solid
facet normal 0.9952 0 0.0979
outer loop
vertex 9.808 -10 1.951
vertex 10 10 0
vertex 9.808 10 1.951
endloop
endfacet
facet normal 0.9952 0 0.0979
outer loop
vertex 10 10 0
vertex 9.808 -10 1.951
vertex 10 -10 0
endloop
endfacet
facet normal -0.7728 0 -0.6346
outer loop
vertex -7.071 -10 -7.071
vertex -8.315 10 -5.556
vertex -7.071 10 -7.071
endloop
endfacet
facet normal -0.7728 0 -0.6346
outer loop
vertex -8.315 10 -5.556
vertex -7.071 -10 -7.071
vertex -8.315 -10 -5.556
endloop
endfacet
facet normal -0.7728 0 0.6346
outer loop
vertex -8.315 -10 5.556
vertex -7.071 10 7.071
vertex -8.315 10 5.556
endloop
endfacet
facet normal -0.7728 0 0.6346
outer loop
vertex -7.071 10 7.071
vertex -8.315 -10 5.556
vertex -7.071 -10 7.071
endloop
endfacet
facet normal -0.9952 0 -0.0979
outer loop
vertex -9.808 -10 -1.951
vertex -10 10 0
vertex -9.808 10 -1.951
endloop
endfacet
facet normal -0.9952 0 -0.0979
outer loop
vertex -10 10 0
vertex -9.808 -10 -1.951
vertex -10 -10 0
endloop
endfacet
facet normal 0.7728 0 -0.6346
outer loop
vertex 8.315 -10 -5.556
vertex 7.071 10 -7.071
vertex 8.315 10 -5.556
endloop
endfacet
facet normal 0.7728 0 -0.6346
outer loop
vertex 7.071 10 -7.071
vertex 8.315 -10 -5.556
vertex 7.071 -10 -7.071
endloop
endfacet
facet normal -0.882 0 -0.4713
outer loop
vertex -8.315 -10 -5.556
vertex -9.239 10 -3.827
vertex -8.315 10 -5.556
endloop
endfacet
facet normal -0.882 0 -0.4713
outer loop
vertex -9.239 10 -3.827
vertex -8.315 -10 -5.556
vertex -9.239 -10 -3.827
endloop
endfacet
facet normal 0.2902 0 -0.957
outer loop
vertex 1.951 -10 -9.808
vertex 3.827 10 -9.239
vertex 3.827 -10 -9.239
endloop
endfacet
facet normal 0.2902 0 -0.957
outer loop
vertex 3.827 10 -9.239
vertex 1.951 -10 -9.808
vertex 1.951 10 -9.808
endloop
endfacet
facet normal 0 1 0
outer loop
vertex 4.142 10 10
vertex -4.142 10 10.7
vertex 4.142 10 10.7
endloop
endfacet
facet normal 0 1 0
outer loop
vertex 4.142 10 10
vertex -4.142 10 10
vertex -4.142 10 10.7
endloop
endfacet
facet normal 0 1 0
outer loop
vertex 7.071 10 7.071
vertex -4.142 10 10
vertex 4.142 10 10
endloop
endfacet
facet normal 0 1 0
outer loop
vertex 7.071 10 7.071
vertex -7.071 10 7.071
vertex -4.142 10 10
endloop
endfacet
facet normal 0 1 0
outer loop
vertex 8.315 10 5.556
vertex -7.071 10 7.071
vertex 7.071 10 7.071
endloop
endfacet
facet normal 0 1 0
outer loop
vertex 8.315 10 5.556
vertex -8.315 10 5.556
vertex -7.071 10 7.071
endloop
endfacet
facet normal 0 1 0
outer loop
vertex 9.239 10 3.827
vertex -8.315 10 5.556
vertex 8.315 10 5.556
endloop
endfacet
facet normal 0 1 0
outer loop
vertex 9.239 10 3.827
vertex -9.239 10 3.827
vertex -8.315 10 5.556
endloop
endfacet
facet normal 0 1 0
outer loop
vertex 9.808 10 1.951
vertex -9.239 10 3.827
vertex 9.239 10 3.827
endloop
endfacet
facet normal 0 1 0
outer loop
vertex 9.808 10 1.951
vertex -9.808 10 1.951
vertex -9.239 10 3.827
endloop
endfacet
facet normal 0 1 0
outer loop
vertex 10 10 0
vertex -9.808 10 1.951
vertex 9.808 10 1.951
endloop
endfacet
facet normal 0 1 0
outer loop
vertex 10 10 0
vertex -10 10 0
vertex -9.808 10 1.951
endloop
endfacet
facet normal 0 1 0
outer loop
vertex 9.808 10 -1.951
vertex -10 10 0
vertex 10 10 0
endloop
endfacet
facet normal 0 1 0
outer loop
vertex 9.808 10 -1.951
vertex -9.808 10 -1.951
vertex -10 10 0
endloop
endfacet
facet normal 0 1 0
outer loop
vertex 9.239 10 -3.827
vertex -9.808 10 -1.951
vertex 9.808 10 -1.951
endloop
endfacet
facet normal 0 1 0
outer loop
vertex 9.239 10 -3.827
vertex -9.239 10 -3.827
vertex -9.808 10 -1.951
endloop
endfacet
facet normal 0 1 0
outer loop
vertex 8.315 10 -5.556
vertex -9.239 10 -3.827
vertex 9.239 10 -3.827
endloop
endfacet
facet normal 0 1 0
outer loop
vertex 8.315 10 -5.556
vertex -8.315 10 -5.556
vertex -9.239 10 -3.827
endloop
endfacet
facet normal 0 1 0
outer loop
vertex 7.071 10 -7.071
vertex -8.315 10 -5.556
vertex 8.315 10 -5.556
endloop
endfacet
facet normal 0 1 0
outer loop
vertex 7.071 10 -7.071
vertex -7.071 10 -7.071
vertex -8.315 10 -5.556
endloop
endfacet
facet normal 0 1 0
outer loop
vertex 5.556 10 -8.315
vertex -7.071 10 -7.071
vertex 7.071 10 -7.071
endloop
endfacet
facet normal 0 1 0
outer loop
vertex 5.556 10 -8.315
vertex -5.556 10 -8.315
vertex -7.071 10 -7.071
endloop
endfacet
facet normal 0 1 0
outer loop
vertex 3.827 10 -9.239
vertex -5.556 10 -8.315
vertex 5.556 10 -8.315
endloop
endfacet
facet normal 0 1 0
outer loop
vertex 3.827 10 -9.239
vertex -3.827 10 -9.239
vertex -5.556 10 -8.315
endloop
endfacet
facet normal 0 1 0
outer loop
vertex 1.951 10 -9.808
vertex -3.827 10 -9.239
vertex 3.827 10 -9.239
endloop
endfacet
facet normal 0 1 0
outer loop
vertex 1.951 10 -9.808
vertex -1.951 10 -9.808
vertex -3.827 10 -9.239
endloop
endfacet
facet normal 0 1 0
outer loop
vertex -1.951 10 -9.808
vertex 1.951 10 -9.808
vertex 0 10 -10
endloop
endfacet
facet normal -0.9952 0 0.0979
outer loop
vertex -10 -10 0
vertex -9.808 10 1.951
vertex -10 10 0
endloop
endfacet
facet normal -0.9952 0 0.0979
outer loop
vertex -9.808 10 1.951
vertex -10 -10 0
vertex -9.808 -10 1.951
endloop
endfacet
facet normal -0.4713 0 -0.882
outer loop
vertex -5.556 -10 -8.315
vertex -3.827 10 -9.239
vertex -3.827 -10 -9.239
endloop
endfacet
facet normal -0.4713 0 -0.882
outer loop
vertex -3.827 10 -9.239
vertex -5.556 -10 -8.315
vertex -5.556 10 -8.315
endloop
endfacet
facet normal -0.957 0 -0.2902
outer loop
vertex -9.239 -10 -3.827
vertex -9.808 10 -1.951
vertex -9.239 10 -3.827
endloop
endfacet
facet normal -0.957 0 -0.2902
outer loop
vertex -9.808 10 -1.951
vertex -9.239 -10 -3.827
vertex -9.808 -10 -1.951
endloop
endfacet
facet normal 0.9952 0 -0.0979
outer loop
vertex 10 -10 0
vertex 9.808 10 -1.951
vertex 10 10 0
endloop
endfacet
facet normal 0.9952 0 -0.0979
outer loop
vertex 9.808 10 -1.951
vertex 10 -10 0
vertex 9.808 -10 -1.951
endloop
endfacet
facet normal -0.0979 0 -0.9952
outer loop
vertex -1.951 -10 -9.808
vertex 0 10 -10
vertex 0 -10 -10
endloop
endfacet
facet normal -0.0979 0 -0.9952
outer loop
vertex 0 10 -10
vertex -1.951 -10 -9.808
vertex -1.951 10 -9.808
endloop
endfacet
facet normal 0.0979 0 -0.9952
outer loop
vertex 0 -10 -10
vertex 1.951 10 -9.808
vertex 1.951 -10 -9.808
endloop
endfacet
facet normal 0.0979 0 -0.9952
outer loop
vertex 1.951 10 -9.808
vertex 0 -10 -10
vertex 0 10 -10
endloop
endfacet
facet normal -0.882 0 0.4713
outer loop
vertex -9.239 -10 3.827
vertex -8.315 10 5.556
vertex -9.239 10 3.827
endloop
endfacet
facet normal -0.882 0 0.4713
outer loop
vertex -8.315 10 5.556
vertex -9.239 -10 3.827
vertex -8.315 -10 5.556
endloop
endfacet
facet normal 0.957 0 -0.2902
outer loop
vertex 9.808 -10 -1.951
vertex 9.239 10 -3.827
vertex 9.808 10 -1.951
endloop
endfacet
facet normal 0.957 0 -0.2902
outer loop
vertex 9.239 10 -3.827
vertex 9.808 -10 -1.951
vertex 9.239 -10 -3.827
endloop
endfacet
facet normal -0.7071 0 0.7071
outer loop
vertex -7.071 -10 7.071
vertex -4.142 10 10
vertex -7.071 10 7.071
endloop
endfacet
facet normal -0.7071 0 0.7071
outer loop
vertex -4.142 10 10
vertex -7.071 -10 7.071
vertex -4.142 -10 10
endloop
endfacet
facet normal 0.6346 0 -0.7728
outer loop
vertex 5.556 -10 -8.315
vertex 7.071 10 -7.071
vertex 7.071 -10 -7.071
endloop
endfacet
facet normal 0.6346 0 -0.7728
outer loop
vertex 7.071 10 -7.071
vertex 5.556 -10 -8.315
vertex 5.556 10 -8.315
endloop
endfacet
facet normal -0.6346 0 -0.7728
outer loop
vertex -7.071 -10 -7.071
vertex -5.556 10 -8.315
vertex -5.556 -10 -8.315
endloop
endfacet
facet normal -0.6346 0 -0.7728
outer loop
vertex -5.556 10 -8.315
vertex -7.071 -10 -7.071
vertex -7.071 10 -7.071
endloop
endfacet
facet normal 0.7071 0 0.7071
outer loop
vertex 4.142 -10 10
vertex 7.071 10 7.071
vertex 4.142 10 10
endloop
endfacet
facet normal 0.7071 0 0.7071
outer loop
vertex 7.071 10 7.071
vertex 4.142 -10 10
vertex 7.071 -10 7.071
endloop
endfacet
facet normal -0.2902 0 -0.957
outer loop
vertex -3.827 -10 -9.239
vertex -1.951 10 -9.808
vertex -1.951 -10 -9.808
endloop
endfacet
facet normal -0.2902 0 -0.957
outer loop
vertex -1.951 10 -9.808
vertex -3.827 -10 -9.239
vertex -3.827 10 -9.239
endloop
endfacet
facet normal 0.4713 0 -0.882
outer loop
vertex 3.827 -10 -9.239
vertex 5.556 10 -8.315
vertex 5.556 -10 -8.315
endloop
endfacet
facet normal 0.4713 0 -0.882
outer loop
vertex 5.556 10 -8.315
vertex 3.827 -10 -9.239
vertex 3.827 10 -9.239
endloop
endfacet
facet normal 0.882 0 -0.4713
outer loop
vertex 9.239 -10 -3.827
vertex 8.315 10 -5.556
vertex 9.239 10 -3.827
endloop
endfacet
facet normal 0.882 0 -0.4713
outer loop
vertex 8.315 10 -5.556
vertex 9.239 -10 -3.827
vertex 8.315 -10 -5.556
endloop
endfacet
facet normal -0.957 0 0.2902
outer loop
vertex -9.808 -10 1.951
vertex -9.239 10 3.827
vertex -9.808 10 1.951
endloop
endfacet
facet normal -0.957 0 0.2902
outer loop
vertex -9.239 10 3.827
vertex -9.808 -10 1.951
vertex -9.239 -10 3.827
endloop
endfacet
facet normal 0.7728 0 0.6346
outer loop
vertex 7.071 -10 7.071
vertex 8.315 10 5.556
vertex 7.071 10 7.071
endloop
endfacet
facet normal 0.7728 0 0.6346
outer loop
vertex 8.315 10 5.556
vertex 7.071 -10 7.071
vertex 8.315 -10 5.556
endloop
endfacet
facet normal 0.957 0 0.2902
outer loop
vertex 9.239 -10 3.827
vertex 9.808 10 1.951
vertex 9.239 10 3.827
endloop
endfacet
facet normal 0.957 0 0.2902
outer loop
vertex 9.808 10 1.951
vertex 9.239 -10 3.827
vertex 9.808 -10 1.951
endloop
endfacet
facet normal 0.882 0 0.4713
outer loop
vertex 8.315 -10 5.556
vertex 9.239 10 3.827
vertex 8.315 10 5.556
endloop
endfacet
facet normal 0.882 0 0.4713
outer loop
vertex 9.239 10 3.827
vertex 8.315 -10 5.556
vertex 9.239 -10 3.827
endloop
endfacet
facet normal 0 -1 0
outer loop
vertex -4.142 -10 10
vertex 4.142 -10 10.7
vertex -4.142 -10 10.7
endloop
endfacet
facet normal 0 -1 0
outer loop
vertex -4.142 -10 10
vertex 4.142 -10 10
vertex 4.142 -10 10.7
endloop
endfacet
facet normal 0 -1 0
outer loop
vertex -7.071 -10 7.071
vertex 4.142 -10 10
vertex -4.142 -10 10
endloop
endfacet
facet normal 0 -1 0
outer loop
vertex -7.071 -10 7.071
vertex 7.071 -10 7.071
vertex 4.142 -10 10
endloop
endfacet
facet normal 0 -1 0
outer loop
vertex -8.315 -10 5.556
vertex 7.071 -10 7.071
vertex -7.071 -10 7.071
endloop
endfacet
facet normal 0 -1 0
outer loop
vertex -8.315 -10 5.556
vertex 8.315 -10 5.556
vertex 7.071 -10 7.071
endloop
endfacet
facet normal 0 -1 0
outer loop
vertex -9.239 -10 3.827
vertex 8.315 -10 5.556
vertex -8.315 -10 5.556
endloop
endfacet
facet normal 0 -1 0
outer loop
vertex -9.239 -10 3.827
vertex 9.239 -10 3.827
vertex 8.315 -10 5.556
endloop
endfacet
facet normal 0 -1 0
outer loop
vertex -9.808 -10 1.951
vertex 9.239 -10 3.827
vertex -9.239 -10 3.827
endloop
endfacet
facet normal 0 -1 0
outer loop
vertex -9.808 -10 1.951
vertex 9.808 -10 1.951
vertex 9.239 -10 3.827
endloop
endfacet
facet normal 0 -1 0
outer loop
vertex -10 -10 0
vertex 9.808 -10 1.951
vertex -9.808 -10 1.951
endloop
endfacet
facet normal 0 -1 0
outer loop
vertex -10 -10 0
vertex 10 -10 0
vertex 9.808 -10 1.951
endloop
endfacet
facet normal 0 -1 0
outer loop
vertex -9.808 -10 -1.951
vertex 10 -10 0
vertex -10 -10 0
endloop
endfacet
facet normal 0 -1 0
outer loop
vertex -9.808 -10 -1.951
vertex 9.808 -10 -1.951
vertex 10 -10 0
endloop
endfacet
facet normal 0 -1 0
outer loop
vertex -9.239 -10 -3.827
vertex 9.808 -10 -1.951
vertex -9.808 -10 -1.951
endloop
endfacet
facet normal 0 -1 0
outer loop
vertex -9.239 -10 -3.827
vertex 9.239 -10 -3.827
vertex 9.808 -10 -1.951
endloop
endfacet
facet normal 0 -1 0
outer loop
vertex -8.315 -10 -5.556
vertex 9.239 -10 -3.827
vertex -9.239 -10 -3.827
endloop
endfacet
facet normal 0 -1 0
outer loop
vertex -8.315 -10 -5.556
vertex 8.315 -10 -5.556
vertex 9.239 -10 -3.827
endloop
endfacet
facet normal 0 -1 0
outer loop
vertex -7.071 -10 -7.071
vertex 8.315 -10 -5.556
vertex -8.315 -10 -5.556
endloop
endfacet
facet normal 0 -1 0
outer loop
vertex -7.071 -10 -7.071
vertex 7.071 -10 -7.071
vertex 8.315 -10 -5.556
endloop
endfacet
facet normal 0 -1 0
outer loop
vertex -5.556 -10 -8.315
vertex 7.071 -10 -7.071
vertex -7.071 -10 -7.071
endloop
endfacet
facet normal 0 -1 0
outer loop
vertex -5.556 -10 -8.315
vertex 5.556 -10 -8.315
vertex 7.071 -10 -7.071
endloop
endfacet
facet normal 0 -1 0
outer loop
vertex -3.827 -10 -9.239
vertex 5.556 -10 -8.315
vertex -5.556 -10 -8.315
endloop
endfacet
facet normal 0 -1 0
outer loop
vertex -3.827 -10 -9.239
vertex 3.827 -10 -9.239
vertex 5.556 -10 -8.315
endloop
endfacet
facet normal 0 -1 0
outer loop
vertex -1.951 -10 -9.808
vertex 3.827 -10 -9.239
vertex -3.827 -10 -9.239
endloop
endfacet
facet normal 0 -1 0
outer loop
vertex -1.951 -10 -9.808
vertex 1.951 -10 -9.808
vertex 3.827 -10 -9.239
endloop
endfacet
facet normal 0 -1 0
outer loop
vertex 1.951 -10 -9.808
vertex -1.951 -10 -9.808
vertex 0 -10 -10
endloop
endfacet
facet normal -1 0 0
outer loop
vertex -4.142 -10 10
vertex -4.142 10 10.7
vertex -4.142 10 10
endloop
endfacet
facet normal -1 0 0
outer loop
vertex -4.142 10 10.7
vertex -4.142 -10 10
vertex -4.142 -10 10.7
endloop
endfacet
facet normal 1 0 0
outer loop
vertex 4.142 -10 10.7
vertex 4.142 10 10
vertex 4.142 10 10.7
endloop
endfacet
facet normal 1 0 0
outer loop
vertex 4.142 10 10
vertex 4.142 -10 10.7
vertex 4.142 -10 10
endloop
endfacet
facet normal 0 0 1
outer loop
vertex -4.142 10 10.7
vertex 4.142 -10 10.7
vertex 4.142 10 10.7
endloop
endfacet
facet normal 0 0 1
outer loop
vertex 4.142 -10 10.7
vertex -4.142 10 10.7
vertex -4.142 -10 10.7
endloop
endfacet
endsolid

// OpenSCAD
//utilities
module reflect(axis){ //reflects its children about the origin, but keeps the originals
	children();
	mirror(axis) children();
}
module repeat(delta,N,center=false){ //repeat something along a regular array
	translate( (center ?  -(N-1)/2 : 0) * delta)
				for(i=[0:1:(N-1)]) translate(i*delta) children();
}

module oldnut(d,h=-1,center=false,fudge=1,shaft=false){ //make a nut, for metric bolt of nominal diameter d
	//d: nominal bolt diameter (e.g. 3 for M3)
	//h: height of nut
	//center: works as for cylinder
	//fudge: multiply the diameter by this number (1.22 works when vertical)
	//shaft: include a long cylinder representing the bolt shaft, diameter=d*1.05
	assign(h=(h<0)?d*0.8:h) union(){
		linear_extrude(h,center=center) for(theta=[0:60:300])
			rotate(theta) polygon([[0,0],[0,1],[sin(60.01),cos(60.01)]]*0.9*d*fudge); 
		if(shaft){
			reflect([0,0,1]) cylinder(r=d/2*1.05*(fudge+1)/2,h=99999999999,$fn=16); 
			//the reason I reflect rather than use center=true is that the latter 
			//fails in fast preview mode (I guess because of the lack of points 
			//inside the nut).  Also, less fudge is applied to the shaft, it can
			//always be fixed with a drill after all...
		}
	}
}
module nut(d,h=-1,center=false,fudge=1,shaft=false){ //make a nut, for metric bolt of nominal diameter d
	//d: nominal bolt diameter (e.g. 3 for M3)
	//h: height of nut
	//center: works as for cylinder
	//fudge: multiply the diameter by this number (1.22 works when vertical)
	//shaft: include a long cylinder representing the bolt shaft, diameter=d*1.05
	assign(h=(h<0)?d*0.8:h) union(){
		cylinder(h=h,center=center,r=0.9*d*fudge,$fn=6); 
		if(shaft){
			reflect([0,0,1]) cylinder(r=d/2*1.05*(fudge+1)/2,h=99999999999,$fn=16); 
			//the reason I reflect rather than use center=true is that the latter 
			//fails in fast preview mode (I guess because of the lack of points 
			//inside the nut).  Also, less fudge is applied to the shaft, it can
			//always be fixed with a drill after all...
		}
	}
}

module unrotate(rotation){
	//undo a previous rotation, NB this is NOT the same as rotate(-rotation) due to ordering.
	rotate([0,0,-rotation[2]]) rotate([0,-rotation[1],0]) rotate([-rotation[0],0,0]) children();
}

module support(size, height, baseheight=0, rotation=[0,0,0], supportangle=45, outline=false){
	//generate "support material" in the STL file for selective supporting of things
	module support_2d() assign(sw=1.0, sp=3){
		union(){
			if(outline){
				difference()	{
					minkowski(){
						children();
						circle(r=sw,$fn=8);
					}
					children();
				}
			}
			intersection(){
				children();
				rotate(supportangle) for(x=[-size:sp:size])
					translate([x,0]) square([sw,2*size],center=true);
			}
		}
	}
	
	unrotate(rotation){
		translate([0,0,baseheight]) linear_extrude(height) support_2d() projection() rotate(rotation) children();
	}
	children();
}

module rightangle_prism(size,center=false){
	intersection(){
		cube(size,center=center);
		rotate([0,45,0]) translate([9999/2,0,0]) cube([1,1,1]*9999,center=true);
	}
}

module sequential_hull(){
	//given a sequence of >2 children, take the convex hull between each pair - a helpful, general extrusion technique.
	for(i=[0:$children-2]){
		hull(){
			children(i);
			children(i+1);
		}
	}
}

module cylinder_with_45deg_top(h,r,center=false,extra_height=0.7,$fn=$fn){
	union(){
		rotate([90,0,0]) hull(){
			cylinder(h=h,r=r,$fn=$fn,center=center);
			translate([0,r-0.001,center?0:h/2]) cube([2*(sqrt(2)-1)*r,0.002,h],center=true);
		}
		rotate([90,0,0]) translate([0,r-0.001,(center?0:h/2)]) cube([2*(sqrt(2)-1)*r,0.002+2*extra_height,h],center=true);
	}
}

cylinder_with_45deg_top(20,10,center=true,$fn=32,extraheight=0.5);

//$fn=12;
//sequential_hull(){
//	translate([0,0,0]) sphere(r=.2);
//	translate([0,1,0]) sphere(r=.2);
//	translate([0,1,1]) sphere(r=.2);
//	translate([1,1,1]) sphere(r=.2);
//}

//nut(3,shaft=true);

//rightangle_prism([1,1,1],center=true);

//support(50,20,baseheight=-20,rotation=[90,0,0]) sphere(r=8,$fn=16);
